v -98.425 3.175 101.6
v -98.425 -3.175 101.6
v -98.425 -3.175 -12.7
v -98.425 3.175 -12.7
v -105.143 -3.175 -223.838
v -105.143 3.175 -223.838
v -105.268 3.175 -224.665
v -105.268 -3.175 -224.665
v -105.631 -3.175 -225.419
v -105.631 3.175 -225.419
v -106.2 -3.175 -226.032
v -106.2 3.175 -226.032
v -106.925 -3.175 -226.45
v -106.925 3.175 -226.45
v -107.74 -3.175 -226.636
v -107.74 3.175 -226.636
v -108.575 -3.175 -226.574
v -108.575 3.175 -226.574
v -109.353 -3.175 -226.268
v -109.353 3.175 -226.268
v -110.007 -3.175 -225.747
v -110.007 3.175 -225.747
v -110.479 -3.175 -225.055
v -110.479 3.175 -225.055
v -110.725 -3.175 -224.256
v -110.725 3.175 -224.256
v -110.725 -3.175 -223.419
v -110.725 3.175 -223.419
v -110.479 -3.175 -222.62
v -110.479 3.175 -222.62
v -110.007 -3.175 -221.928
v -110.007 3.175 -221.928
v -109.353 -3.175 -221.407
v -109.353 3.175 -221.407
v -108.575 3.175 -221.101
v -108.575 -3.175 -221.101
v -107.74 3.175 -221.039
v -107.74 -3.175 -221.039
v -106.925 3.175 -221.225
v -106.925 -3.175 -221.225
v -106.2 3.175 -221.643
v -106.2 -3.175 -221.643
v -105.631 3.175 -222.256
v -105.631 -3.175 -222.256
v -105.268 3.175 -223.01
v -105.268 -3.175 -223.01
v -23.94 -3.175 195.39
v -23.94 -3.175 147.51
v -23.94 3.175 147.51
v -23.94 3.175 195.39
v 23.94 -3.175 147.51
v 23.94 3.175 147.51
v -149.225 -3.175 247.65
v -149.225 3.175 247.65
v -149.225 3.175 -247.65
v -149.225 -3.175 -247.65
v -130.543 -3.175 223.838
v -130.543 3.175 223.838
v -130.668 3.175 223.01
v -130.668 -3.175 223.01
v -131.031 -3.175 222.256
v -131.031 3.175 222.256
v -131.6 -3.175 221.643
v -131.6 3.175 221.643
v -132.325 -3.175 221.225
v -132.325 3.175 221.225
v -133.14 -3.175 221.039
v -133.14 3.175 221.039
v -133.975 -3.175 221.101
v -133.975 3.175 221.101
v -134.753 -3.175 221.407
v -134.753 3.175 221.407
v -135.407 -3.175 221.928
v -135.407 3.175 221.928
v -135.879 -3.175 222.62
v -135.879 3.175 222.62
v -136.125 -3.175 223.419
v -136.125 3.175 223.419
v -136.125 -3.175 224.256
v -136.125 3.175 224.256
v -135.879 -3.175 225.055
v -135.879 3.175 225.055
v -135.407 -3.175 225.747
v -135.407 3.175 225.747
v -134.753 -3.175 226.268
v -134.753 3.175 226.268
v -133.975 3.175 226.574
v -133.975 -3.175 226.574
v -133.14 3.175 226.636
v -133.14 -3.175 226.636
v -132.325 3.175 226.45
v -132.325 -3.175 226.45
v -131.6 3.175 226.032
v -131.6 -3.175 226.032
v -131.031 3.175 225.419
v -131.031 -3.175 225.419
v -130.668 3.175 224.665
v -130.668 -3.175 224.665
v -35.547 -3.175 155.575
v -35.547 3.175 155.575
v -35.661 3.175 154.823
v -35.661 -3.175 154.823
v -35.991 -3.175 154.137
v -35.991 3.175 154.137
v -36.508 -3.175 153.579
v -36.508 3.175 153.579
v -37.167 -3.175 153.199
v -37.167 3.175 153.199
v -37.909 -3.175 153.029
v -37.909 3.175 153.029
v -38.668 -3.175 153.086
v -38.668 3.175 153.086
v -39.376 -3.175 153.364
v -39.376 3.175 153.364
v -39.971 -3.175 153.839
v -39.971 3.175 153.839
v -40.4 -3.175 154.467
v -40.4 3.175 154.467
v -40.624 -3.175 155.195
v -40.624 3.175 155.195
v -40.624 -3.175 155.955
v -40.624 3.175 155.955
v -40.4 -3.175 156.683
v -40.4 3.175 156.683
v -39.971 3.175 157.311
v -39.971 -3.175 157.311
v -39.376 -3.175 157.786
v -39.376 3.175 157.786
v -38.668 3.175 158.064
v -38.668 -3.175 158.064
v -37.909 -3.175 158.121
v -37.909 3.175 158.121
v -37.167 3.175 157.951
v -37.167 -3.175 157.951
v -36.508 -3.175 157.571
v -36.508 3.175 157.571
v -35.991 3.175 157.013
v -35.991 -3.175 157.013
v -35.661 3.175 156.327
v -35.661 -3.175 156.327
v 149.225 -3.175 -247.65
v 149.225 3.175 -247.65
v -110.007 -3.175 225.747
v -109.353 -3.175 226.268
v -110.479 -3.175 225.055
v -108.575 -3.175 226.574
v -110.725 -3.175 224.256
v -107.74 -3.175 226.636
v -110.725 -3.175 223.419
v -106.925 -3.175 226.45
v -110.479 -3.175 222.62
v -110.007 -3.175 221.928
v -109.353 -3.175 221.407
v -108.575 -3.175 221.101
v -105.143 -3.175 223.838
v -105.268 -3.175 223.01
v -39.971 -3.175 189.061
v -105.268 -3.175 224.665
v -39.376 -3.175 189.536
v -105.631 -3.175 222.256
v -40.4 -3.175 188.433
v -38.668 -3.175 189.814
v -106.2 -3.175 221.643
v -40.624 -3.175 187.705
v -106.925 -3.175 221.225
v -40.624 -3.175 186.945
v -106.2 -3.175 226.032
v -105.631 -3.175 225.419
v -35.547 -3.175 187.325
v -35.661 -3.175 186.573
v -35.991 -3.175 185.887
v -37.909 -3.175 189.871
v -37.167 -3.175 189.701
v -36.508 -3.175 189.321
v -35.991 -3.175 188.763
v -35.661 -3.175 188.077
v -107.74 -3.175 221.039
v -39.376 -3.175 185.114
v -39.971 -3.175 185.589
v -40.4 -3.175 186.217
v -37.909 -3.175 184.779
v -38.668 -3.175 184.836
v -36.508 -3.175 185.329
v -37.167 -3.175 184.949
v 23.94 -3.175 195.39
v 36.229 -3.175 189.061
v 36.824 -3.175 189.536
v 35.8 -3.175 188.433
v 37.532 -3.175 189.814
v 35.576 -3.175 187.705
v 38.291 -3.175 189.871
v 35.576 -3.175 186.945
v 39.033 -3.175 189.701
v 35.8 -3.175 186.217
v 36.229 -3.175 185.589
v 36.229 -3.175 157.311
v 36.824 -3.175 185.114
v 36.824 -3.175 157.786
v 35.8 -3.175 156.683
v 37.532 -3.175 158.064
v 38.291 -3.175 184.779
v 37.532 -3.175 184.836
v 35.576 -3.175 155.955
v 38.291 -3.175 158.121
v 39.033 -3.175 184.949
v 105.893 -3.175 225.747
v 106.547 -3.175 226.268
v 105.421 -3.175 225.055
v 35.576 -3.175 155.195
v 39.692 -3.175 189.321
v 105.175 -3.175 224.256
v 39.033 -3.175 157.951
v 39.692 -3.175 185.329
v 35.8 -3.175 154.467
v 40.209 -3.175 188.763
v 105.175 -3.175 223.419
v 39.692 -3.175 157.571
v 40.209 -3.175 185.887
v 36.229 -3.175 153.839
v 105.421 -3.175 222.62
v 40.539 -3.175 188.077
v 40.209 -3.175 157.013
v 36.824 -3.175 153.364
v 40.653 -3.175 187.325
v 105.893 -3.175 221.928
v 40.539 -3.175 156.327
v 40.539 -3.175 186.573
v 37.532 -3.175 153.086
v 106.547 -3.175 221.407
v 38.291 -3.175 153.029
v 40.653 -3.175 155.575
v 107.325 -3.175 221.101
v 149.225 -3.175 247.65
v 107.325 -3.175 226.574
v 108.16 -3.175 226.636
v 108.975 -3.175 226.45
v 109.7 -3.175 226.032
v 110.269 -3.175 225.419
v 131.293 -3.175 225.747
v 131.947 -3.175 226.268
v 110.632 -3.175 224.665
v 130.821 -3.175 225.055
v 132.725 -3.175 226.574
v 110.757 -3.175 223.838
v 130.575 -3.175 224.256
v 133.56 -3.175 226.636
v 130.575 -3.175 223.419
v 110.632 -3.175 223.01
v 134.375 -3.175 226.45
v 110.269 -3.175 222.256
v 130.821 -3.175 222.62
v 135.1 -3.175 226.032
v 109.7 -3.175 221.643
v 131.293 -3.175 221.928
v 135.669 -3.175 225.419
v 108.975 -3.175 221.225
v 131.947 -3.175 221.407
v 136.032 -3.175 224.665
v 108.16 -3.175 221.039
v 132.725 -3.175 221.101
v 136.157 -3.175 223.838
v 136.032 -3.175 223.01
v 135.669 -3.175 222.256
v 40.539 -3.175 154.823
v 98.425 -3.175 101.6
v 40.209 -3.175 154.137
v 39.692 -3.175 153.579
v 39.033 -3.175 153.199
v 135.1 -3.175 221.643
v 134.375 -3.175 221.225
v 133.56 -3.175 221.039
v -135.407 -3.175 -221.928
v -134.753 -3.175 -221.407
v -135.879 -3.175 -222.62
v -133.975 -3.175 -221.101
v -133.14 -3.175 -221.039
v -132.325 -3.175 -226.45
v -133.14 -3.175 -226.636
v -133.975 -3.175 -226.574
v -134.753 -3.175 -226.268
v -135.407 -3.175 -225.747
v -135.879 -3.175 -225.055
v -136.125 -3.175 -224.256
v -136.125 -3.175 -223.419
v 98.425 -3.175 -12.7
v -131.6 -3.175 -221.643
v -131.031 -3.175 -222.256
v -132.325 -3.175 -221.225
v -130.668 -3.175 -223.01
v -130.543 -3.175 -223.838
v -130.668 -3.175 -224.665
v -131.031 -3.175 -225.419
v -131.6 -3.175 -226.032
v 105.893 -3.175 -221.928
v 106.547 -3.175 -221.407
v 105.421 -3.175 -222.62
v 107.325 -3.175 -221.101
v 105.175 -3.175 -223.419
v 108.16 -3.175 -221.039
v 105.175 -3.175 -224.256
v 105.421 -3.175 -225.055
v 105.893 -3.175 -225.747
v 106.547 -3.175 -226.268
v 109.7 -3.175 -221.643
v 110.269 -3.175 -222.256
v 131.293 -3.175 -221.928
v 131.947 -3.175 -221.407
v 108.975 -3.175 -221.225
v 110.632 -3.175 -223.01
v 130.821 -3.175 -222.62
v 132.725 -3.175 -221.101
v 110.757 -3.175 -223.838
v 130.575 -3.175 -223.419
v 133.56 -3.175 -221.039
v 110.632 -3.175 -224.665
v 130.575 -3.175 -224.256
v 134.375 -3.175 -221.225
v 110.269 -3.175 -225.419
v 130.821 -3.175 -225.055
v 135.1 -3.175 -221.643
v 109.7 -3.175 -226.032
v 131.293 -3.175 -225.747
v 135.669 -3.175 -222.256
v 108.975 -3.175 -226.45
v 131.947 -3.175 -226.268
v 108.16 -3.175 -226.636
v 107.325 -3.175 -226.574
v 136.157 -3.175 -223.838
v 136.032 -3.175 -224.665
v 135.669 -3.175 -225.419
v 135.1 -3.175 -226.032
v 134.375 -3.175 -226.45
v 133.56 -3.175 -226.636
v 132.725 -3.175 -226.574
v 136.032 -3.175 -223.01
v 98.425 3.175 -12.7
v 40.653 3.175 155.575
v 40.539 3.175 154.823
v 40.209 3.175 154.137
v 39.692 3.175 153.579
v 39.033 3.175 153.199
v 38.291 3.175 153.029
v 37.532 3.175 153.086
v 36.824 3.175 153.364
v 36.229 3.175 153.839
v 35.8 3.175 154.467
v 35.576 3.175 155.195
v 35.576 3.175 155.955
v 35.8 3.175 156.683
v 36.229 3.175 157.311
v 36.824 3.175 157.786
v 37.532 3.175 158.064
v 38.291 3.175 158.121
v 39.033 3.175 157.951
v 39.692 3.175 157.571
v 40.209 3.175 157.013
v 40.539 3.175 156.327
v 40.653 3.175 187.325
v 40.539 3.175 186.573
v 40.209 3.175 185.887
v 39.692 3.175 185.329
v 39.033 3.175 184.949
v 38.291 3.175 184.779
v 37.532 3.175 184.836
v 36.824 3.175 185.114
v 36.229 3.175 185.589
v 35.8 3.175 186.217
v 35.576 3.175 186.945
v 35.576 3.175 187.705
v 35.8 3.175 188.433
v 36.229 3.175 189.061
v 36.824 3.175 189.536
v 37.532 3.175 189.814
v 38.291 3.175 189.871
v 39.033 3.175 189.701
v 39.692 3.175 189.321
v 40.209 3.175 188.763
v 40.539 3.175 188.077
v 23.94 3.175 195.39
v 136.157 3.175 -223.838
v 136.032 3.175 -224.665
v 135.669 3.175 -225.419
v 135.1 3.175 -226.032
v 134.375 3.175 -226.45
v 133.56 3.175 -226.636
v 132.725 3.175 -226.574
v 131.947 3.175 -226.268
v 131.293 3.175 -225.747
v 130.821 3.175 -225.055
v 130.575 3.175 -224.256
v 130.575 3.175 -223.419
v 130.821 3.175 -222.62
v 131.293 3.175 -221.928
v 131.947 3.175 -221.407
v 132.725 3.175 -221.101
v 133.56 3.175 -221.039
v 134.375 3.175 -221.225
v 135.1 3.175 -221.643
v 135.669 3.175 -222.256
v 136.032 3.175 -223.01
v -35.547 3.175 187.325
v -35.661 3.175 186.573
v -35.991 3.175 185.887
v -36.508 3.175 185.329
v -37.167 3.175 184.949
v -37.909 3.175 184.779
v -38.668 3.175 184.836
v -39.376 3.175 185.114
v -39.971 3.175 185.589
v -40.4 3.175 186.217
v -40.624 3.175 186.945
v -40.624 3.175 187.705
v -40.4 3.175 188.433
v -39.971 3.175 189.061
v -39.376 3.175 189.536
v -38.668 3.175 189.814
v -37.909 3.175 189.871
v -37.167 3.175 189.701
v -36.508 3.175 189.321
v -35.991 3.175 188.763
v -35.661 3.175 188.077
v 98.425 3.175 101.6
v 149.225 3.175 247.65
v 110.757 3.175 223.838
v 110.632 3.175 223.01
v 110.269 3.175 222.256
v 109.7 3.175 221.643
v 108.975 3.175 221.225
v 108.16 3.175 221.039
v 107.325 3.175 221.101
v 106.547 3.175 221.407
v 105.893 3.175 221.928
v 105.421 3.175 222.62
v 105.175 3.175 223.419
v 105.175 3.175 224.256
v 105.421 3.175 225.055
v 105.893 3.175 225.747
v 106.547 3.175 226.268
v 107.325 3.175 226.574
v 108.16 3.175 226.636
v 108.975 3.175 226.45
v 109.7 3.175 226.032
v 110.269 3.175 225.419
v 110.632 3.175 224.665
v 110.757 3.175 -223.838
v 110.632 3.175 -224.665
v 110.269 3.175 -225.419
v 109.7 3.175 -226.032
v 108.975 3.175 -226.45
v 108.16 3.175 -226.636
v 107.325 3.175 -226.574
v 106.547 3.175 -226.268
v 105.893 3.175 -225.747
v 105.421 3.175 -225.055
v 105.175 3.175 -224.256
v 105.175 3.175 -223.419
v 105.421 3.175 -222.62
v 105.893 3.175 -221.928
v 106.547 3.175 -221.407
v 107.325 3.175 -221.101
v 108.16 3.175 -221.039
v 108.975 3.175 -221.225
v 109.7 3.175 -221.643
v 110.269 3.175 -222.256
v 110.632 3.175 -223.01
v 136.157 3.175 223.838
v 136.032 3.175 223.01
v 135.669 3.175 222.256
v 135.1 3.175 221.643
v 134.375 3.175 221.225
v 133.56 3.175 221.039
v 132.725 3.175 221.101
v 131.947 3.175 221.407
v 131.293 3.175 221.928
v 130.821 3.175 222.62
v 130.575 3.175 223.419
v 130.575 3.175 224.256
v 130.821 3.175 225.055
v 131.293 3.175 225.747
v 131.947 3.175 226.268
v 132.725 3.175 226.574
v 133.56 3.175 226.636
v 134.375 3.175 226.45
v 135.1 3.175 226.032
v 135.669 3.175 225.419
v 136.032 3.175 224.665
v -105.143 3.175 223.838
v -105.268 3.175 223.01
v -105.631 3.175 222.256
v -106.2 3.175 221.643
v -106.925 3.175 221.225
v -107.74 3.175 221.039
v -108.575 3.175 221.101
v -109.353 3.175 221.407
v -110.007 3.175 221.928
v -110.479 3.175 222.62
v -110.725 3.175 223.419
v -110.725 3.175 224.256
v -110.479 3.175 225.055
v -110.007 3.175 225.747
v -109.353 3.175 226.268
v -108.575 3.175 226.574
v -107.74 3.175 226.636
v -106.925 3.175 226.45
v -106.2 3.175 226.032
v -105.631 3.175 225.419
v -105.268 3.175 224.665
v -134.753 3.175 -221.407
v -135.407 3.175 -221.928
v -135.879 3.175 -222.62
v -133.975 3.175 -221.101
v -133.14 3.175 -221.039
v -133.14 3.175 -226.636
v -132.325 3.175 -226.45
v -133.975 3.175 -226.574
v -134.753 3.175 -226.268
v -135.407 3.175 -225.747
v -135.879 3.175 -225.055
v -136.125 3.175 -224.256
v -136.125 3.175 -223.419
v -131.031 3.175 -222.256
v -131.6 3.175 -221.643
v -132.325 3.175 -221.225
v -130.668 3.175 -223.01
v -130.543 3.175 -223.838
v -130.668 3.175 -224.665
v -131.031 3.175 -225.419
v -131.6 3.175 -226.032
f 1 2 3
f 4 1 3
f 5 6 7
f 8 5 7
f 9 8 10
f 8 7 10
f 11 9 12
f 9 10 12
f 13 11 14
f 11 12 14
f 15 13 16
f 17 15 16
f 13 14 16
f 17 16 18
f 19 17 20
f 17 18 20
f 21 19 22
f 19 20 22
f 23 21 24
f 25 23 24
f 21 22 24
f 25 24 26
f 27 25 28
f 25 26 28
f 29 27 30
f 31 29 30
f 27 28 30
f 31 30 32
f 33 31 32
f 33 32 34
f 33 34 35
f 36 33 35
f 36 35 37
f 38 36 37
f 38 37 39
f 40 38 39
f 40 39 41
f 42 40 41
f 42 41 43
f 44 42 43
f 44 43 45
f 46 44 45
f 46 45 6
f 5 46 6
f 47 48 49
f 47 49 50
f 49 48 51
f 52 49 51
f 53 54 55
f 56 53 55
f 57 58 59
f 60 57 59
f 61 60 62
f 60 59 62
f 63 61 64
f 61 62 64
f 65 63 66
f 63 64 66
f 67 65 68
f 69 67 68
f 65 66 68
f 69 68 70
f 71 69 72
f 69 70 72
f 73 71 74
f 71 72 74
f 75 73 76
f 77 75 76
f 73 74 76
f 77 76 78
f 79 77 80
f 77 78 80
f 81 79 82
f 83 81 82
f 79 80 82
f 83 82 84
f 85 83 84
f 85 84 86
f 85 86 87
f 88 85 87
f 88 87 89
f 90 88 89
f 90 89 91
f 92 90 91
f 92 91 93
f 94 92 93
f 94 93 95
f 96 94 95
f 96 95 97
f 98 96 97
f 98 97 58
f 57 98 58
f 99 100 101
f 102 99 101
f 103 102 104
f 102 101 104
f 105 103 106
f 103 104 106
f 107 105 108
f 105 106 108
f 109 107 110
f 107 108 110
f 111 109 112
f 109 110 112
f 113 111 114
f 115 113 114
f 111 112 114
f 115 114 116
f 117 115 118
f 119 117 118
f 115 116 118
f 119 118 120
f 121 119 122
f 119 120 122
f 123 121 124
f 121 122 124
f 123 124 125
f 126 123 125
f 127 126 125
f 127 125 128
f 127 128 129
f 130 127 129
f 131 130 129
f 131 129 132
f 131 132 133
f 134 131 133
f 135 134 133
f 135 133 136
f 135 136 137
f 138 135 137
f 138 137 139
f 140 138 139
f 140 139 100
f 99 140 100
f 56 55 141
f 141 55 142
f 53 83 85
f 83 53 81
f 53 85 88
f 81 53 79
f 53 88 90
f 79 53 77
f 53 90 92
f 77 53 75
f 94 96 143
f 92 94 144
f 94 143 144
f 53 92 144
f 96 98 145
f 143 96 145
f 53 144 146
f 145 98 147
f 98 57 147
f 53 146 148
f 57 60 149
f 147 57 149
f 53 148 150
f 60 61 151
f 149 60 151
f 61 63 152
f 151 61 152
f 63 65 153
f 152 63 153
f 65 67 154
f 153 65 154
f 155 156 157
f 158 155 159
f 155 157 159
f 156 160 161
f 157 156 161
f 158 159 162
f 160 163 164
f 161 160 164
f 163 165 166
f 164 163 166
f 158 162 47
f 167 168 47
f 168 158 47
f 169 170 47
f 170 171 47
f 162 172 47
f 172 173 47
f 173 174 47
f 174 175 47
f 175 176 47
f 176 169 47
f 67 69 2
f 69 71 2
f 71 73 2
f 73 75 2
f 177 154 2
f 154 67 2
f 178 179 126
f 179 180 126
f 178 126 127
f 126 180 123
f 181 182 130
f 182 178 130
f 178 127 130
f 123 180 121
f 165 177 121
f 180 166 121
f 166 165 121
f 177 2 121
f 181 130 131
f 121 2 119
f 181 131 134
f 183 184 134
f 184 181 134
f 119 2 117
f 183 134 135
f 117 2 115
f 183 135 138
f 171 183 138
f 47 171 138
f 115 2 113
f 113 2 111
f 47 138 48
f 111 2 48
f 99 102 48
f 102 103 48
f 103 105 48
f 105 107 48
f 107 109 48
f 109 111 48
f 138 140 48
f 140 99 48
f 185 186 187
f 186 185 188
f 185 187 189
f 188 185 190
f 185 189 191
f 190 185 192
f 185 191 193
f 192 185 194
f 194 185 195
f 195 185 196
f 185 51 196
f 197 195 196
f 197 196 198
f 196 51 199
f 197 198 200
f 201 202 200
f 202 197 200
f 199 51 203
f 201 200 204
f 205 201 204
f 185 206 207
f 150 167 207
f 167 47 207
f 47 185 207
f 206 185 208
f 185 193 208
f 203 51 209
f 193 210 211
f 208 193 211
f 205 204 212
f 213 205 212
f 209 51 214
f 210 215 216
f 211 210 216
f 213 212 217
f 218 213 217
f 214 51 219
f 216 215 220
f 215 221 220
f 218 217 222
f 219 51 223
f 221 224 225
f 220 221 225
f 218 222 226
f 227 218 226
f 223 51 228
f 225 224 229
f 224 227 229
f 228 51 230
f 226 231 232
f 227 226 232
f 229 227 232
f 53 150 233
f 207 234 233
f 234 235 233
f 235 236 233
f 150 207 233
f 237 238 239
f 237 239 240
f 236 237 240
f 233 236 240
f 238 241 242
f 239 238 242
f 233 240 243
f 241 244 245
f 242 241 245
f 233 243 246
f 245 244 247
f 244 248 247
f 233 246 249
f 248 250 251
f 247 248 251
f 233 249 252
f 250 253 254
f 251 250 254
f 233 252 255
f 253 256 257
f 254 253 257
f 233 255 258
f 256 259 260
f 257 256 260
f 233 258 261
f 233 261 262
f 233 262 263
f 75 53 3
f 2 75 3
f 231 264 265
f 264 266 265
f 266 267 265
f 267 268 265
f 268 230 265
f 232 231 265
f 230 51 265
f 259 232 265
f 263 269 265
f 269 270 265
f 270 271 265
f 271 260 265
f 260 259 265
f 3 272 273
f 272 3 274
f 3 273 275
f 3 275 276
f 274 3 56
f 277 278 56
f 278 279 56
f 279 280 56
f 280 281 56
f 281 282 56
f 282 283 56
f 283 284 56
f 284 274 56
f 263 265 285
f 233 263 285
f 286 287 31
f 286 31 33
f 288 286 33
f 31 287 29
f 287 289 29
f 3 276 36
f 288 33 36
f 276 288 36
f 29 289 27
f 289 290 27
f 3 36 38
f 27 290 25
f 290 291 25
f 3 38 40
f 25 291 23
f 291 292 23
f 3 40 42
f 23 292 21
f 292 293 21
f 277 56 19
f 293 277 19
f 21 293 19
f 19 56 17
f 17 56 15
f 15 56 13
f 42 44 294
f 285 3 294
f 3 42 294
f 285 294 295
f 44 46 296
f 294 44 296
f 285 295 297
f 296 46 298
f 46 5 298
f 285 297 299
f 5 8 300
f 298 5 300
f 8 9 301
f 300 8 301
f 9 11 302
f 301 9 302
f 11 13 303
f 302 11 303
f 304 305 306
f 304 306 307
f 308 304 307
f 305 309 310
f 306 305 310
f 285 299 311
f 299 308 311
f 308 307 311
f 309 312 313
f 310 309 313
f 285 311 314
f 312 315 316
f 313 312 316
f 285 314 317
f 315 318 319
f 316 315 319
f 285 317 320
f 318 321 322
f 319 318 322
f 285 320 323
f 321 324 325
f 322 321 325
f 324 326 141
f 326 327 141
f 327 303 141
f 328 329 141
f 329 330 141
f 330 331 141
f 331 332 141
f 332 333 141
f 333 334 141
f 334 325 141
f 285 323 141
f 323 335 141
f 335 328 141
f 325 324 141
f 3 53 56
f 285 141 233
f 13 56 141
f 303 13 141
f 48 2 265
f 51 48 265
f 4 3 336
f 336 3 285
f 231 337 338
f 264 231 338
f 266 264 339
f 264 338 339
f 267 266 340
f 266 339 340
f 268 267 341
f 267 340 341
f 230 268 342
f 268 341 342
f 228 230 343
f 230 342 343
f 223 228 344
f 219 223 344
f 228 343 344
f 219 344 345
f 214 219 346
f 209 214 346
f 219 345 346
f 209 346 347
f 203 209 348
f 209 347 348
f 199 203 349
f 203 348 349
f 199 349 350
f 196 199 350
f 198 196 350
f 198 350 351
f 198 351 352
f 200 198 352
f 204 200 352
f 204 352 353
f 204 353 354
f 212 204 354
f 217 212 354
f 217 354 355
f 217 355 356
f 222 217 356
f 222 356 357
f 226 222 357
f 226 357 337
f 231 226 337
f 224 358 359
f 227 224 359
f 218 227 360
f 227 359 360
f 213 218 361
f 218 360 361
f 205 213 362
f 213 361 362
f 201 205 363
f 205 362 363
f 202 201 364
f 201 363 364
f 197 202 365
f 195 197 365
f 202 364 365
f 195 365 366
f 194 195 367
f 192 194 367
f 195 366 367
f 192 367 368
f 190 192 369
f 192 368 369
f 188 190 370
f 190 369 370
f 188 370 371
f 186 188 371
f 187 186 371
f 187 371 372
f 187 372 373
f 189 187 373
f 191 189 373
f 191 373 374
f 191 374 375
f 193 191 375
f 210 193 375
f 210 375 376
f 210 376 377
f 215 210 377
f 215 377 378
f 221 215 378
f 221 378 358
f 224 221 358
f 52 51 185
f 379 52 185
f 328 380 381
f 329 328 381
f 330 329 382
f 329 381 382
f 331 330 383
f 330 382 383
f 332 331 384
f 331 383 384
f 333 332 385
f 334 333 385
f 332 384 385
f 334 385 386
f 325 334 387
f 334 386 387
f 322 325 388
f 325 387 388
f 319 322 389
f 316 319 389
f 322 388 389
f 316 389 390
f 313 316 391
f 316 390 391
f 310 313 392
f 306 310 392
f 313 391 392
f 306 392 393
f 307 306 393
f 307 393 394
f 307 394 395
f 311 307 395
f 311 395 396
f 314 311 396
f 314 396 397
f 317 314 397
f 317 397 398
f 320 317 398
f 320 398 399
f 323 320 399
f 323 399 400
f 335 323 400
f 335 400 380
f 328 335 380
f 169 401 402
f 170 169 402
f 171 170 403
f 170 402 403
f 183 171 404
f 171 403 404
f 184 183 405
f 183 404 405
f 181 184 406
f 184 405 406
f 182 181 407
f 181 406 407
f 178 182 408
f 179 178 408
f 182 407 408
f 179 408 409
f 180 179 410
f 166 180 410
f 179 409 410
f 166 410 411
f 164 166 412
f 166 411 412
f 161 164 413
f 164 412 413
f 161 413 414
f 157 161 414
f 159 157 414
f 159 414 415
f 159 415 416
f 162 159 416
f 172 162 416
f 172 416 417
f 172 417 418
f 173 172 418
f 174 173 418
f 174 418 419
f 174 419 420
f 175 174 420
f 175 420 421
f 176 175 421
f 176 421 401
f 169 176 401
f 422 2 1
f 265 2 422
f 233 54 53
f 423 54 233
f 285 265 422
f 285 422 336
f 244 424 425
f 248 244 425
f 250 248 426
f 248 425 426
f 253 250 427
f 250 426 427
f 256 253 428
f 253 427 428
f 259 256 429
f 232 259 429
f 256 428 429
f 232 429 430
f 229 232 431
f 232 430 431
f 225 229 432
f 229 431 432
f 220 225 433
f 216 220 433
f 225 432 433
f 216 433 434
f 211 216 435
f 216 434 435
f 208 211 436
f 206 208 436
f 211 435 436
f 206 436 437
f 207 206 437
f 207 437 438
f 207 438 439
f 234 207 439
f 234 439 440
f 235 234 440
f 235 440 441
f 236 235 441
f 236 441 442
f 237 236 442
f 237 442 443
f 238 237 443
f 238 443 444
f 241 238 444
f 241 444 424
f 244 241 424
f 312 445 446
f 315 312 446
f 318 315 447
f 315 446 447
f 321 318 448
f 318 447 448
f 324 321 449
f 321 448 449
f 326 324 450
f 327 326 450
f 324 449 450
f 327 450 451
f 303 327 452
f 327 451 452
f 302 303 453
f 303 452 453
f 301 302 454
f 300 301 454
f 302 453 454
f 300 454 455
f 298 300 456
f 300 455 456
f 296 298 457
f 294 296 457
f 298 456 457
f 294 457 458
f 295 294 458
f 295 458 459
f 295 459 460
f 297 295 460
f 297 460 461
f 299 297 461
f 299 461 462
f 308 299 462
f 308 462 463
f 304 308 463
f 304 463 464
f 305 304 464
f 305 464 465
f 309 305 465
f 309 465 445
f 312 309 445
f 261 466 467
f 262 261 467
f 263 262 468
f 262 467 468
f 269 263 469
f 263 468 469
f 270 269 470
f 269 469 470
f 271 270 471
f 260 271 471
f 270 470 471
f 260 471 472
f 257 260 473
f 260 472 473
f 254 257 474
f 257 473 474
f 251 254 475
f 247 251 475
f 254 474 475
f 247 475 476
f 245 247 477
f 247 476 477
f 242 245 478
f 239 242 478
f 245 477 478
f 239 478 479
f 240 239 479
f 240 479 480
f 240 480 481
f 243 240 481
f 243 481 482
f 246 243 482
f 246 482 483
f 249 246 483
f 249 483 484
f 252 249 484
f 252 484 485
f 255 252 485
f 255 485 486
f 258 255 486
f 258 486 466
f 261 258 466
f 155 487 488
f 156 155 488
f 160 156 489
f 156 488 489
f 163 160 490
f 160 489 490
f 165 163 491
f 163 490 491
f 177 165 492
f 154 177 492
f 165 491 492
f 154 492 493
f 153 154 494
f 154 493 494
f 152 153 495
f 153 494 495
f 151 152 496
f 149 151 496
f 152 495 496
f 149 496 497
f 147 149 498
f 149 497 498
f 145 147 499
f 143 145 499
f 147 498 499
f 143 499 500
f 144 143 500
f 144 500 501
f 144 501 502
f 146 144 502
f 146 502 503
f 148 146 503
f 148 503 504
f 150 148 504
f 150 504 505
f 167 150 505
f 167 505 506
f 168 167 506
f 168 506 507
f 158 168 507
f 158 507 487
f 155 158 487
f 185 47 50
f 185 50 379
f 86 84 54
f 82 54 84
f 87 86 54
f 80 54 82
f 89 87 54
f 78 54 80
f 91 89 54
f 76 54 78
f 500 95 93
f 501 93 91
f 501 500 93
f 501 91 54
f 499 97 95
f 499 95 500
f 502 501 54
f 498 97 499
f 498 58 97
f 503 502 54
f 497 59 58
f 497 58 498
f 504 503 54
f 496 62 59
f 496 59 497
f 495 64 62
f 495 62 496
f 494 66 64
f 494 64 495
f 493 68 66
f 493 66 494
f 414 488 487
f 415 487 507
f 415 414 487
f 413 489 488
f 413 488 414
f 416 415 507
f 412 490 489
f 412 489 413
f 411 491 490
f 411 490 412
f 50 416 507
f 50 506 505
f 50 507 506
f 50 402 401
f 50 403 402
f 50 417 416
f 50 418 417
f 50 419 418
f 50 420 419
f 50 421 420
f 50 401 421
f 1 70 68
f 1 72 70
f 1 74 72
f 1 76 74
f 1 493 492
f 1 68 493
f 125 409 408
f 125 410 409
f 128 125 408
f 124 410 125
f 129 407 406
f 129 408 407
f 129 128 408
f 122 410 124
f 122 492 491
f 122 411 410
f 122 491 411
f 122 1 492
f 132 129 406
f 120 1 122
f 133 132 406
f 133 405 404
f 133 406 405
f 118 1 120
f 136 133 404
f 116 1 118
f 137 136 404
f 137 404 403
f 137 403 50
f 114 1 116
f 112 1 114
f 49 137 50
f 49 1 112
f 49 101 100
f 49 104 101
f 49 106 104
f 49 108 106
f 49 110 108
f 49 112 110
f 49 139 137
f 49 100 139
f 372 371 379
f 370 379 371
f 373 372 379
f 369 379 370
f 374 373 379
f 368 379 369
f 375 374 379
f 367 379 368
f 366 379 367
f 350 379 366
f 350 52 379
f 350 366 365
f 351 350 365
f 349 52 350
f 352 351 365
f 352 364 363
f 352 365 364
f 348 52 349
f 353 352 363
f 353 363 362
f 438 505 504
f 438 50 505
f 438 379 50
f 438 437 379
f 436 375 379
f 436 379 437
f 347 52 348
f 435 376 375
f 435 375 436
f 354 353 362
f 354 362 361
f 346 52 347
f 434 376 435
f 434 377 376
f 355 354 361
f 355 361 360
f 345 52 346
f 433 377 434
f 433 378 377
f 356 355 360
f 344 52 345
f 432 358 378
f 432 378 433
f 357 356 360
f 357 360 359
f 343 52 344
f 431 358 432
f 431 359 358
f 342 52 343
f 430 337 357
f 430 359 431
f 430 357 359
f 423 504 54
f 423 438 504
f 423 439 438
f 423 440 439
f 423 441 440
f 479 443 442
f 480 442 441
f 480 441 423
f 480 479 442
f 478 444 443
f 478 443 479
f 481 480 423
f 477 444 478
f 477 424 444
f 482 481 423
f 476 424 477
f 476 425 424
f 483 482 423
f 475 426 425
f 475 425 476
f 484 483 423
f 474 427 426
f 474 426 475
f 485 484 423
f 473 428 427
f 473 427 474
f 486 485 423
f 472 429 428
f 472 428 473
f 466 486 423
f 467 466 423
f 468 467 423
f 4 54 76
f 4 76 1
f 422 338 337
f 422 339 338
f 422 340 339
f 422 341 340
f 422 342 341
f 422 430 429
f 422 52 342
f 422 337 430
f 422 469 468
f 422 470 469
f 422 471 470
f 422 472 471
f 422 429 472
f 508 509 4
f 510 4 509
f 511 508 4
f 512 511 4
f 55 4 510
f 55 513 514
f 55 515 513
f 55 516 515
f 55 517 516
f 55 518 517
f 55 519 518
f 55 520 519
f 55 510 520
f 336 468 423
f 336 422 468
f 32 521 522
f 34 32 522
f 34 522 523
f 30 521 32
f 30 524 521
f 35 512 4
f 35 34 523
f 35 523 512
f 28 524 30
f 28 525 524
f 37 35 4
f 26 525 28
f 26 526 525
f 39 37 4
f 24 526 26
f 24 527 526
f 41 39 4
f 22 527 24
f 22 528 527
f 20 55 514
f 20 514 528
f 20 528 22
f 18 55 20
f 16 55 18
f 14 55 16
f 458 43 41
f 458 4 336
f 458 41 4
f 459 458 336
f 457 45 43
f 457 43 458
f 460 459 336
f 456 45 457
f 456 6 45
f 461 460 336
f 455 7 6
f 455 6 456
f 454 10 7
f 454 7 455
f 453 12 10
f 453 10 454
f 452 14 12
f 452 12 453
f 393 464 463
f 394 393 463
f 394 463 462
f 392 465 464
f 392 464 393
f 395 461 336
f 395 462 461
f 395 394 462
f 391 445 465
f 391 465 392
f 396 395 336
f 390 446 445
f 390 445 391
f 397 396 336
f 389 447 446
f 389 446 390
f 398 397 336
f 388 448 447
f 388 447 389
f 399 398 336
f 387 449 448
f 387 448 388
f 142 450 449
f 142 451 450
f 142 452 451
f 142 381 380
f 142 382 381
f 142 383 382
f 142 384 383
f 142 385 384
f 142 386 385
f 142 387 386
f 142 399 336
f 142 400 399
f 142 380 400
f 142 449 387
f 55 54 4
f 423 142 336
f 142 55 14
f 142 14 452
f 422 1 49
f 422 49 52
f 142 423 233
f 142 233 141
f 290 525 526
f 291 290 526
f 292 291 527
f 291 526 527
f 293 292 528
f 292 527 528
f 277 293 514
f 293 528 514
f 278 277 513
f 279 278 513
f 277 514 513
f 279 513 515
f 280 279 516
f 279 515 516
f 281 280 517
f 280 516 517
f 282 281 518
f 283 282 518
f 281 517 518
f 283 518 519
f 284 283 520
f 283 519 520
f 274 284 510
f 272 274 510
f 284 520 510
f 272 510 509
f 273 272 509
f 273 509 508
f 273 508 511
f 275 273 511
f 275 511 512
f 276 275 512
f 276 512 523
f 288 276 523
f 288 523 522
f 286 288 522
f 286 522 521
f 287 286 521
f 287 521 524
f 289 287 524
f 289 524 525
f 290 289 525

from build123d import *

# Parameters (mm, degrees)
SKETCH1_W                  = 298.45
SKETCH1_H                  = 495.3
BOSS_EXTRUDE1_DEPTH        = 3.175
CUT_EXTRUDE1_DEPTH         = 290.203986184
CUT_EXTRUDE1_DEPTH_BACK    = 290.203986184
SKETCH3_W                  = 196.85
SKETCH3_H                  = 114.3
F_12_CLEARANCE_HOLE2_D     = 5.6134
F_12_CLEARANCE_HOLE2_DEPTH = 16.51
F_12_CLEARANCE_HOLE2_TIP   = 1.686435499
SKETCH20_W                 = 47.879
SKETCH20_H                 = 47.879
CUT_EXTRUDE5_DEPTH         = 290.203986184
F_10_CLEARANCE_HOLE1_D     = 5.1054
F_10_CLEARANCE_HOLE1_DEPTH = 10.668
F_10_CLEARANCE_HOLE1_TIP   = 1.533816902


with BuildPart() as part:
    # Sketch1 → Boss-Extrude1 (new, symmetric)
    with BuildSketch(Plane(origin=(0, 0, 0), x_dir=(1, 0, 0), z_dir=(0, 1, 0))):
        Rectangle(SKETCH1_W, SKETCH1_H)
    extrude(amount=BOSS_EXTRUDE1_DEPTH, both=True)

    # Sketch3 → Cut-Extrude1 (cut, two sides: drawn at the far end of the back side and taken through both)
    with BuildSketch(Plane(origin=(0, 3.175, 0), x_dir=(1, 0, 0), z_dir=(0, 1, 0)).offset(-CUT_EXTRUDE1_DEPTH_BACK)):
        with Locations((0, -44.45)):
            Rectangle(SKETCH3_W, SKETCH3_H)
    extrude(amount=CUT_EXTRUDE1_DEPTH + CUT_EXTRUDE1_DEPTH_BACK, mode=Mode.SUBTRACT)

    # #12 Clearance Hole2
    with Locations(Plane(origin=(0, -3.175, 0), x_dir=(-1, 0, 0), z_dir=(0, -1, 0))):
        with Locations((107.95, -223.8375), (133.35, -223.8375), (133.35, 223.8375), (107.95, 223.8375), (-133.35, 223.8375), (-107.95, 223.8375), (-133.35, -223.8375), (-107.95, -223.8375)):
            Hole(F_12_CLEARANCE_HOLE2_D / 2, depth=F_12_CLEARANCE_HOLE2_DEPTH)
            with Locations((0, 0, -(F_12_CLEARANCE_HOLE2_DEPTH + F_12_CLEARANCE_HOLE2_TIP / 2))):  # 118° drill point
                Cone(0, F_12_CLEARANCE_HOLE2_D / 2, F_12_CLEARANCE_HOLE2_TIP, mode=Mode.SUBTRACT)

    # Sketch20 → Cut-Extrude5 (cut, through all)
    with BuildSketch(Plane.XZ.offset(3.175)):
        with Locations((0, 171.45)):
            Rectangle(SKETCH20_W, SKETCH20_H)
    extrude(amount=-CUT_EXTRUDE5_DEPTH, mode=Mode.SUBTRACT)

    # #10 Clearance Hole1
    with Locations(Plane(origin=(0, -3.175, 0), x_dir=(-1, 0, 0), z_dir=(0, -1, 0))):
        with Locations((-38.1, -155.575), (38.1, -155.575), (38.1, -187.325), (-38.1, -187.325)):
            Hole(F_10_CLEARANCE_HOLE1_D / 2, depth=F_10_CLEARANCE_HOLE1_DEPTH)
            with Locations((0, 0, -(F_10_CLEARANCE_HOLE1_DEPTH + F_10_CLEARANCE_HOLE1_TIP / 2))):  # 118° drill point
                Cone(0, F_10_CLEARANCE_HOLE1_D / 2, F_10_CLEARANCE_HOLE1_TIP, mode=Mode.SUBTRACT)


solid = part.part
